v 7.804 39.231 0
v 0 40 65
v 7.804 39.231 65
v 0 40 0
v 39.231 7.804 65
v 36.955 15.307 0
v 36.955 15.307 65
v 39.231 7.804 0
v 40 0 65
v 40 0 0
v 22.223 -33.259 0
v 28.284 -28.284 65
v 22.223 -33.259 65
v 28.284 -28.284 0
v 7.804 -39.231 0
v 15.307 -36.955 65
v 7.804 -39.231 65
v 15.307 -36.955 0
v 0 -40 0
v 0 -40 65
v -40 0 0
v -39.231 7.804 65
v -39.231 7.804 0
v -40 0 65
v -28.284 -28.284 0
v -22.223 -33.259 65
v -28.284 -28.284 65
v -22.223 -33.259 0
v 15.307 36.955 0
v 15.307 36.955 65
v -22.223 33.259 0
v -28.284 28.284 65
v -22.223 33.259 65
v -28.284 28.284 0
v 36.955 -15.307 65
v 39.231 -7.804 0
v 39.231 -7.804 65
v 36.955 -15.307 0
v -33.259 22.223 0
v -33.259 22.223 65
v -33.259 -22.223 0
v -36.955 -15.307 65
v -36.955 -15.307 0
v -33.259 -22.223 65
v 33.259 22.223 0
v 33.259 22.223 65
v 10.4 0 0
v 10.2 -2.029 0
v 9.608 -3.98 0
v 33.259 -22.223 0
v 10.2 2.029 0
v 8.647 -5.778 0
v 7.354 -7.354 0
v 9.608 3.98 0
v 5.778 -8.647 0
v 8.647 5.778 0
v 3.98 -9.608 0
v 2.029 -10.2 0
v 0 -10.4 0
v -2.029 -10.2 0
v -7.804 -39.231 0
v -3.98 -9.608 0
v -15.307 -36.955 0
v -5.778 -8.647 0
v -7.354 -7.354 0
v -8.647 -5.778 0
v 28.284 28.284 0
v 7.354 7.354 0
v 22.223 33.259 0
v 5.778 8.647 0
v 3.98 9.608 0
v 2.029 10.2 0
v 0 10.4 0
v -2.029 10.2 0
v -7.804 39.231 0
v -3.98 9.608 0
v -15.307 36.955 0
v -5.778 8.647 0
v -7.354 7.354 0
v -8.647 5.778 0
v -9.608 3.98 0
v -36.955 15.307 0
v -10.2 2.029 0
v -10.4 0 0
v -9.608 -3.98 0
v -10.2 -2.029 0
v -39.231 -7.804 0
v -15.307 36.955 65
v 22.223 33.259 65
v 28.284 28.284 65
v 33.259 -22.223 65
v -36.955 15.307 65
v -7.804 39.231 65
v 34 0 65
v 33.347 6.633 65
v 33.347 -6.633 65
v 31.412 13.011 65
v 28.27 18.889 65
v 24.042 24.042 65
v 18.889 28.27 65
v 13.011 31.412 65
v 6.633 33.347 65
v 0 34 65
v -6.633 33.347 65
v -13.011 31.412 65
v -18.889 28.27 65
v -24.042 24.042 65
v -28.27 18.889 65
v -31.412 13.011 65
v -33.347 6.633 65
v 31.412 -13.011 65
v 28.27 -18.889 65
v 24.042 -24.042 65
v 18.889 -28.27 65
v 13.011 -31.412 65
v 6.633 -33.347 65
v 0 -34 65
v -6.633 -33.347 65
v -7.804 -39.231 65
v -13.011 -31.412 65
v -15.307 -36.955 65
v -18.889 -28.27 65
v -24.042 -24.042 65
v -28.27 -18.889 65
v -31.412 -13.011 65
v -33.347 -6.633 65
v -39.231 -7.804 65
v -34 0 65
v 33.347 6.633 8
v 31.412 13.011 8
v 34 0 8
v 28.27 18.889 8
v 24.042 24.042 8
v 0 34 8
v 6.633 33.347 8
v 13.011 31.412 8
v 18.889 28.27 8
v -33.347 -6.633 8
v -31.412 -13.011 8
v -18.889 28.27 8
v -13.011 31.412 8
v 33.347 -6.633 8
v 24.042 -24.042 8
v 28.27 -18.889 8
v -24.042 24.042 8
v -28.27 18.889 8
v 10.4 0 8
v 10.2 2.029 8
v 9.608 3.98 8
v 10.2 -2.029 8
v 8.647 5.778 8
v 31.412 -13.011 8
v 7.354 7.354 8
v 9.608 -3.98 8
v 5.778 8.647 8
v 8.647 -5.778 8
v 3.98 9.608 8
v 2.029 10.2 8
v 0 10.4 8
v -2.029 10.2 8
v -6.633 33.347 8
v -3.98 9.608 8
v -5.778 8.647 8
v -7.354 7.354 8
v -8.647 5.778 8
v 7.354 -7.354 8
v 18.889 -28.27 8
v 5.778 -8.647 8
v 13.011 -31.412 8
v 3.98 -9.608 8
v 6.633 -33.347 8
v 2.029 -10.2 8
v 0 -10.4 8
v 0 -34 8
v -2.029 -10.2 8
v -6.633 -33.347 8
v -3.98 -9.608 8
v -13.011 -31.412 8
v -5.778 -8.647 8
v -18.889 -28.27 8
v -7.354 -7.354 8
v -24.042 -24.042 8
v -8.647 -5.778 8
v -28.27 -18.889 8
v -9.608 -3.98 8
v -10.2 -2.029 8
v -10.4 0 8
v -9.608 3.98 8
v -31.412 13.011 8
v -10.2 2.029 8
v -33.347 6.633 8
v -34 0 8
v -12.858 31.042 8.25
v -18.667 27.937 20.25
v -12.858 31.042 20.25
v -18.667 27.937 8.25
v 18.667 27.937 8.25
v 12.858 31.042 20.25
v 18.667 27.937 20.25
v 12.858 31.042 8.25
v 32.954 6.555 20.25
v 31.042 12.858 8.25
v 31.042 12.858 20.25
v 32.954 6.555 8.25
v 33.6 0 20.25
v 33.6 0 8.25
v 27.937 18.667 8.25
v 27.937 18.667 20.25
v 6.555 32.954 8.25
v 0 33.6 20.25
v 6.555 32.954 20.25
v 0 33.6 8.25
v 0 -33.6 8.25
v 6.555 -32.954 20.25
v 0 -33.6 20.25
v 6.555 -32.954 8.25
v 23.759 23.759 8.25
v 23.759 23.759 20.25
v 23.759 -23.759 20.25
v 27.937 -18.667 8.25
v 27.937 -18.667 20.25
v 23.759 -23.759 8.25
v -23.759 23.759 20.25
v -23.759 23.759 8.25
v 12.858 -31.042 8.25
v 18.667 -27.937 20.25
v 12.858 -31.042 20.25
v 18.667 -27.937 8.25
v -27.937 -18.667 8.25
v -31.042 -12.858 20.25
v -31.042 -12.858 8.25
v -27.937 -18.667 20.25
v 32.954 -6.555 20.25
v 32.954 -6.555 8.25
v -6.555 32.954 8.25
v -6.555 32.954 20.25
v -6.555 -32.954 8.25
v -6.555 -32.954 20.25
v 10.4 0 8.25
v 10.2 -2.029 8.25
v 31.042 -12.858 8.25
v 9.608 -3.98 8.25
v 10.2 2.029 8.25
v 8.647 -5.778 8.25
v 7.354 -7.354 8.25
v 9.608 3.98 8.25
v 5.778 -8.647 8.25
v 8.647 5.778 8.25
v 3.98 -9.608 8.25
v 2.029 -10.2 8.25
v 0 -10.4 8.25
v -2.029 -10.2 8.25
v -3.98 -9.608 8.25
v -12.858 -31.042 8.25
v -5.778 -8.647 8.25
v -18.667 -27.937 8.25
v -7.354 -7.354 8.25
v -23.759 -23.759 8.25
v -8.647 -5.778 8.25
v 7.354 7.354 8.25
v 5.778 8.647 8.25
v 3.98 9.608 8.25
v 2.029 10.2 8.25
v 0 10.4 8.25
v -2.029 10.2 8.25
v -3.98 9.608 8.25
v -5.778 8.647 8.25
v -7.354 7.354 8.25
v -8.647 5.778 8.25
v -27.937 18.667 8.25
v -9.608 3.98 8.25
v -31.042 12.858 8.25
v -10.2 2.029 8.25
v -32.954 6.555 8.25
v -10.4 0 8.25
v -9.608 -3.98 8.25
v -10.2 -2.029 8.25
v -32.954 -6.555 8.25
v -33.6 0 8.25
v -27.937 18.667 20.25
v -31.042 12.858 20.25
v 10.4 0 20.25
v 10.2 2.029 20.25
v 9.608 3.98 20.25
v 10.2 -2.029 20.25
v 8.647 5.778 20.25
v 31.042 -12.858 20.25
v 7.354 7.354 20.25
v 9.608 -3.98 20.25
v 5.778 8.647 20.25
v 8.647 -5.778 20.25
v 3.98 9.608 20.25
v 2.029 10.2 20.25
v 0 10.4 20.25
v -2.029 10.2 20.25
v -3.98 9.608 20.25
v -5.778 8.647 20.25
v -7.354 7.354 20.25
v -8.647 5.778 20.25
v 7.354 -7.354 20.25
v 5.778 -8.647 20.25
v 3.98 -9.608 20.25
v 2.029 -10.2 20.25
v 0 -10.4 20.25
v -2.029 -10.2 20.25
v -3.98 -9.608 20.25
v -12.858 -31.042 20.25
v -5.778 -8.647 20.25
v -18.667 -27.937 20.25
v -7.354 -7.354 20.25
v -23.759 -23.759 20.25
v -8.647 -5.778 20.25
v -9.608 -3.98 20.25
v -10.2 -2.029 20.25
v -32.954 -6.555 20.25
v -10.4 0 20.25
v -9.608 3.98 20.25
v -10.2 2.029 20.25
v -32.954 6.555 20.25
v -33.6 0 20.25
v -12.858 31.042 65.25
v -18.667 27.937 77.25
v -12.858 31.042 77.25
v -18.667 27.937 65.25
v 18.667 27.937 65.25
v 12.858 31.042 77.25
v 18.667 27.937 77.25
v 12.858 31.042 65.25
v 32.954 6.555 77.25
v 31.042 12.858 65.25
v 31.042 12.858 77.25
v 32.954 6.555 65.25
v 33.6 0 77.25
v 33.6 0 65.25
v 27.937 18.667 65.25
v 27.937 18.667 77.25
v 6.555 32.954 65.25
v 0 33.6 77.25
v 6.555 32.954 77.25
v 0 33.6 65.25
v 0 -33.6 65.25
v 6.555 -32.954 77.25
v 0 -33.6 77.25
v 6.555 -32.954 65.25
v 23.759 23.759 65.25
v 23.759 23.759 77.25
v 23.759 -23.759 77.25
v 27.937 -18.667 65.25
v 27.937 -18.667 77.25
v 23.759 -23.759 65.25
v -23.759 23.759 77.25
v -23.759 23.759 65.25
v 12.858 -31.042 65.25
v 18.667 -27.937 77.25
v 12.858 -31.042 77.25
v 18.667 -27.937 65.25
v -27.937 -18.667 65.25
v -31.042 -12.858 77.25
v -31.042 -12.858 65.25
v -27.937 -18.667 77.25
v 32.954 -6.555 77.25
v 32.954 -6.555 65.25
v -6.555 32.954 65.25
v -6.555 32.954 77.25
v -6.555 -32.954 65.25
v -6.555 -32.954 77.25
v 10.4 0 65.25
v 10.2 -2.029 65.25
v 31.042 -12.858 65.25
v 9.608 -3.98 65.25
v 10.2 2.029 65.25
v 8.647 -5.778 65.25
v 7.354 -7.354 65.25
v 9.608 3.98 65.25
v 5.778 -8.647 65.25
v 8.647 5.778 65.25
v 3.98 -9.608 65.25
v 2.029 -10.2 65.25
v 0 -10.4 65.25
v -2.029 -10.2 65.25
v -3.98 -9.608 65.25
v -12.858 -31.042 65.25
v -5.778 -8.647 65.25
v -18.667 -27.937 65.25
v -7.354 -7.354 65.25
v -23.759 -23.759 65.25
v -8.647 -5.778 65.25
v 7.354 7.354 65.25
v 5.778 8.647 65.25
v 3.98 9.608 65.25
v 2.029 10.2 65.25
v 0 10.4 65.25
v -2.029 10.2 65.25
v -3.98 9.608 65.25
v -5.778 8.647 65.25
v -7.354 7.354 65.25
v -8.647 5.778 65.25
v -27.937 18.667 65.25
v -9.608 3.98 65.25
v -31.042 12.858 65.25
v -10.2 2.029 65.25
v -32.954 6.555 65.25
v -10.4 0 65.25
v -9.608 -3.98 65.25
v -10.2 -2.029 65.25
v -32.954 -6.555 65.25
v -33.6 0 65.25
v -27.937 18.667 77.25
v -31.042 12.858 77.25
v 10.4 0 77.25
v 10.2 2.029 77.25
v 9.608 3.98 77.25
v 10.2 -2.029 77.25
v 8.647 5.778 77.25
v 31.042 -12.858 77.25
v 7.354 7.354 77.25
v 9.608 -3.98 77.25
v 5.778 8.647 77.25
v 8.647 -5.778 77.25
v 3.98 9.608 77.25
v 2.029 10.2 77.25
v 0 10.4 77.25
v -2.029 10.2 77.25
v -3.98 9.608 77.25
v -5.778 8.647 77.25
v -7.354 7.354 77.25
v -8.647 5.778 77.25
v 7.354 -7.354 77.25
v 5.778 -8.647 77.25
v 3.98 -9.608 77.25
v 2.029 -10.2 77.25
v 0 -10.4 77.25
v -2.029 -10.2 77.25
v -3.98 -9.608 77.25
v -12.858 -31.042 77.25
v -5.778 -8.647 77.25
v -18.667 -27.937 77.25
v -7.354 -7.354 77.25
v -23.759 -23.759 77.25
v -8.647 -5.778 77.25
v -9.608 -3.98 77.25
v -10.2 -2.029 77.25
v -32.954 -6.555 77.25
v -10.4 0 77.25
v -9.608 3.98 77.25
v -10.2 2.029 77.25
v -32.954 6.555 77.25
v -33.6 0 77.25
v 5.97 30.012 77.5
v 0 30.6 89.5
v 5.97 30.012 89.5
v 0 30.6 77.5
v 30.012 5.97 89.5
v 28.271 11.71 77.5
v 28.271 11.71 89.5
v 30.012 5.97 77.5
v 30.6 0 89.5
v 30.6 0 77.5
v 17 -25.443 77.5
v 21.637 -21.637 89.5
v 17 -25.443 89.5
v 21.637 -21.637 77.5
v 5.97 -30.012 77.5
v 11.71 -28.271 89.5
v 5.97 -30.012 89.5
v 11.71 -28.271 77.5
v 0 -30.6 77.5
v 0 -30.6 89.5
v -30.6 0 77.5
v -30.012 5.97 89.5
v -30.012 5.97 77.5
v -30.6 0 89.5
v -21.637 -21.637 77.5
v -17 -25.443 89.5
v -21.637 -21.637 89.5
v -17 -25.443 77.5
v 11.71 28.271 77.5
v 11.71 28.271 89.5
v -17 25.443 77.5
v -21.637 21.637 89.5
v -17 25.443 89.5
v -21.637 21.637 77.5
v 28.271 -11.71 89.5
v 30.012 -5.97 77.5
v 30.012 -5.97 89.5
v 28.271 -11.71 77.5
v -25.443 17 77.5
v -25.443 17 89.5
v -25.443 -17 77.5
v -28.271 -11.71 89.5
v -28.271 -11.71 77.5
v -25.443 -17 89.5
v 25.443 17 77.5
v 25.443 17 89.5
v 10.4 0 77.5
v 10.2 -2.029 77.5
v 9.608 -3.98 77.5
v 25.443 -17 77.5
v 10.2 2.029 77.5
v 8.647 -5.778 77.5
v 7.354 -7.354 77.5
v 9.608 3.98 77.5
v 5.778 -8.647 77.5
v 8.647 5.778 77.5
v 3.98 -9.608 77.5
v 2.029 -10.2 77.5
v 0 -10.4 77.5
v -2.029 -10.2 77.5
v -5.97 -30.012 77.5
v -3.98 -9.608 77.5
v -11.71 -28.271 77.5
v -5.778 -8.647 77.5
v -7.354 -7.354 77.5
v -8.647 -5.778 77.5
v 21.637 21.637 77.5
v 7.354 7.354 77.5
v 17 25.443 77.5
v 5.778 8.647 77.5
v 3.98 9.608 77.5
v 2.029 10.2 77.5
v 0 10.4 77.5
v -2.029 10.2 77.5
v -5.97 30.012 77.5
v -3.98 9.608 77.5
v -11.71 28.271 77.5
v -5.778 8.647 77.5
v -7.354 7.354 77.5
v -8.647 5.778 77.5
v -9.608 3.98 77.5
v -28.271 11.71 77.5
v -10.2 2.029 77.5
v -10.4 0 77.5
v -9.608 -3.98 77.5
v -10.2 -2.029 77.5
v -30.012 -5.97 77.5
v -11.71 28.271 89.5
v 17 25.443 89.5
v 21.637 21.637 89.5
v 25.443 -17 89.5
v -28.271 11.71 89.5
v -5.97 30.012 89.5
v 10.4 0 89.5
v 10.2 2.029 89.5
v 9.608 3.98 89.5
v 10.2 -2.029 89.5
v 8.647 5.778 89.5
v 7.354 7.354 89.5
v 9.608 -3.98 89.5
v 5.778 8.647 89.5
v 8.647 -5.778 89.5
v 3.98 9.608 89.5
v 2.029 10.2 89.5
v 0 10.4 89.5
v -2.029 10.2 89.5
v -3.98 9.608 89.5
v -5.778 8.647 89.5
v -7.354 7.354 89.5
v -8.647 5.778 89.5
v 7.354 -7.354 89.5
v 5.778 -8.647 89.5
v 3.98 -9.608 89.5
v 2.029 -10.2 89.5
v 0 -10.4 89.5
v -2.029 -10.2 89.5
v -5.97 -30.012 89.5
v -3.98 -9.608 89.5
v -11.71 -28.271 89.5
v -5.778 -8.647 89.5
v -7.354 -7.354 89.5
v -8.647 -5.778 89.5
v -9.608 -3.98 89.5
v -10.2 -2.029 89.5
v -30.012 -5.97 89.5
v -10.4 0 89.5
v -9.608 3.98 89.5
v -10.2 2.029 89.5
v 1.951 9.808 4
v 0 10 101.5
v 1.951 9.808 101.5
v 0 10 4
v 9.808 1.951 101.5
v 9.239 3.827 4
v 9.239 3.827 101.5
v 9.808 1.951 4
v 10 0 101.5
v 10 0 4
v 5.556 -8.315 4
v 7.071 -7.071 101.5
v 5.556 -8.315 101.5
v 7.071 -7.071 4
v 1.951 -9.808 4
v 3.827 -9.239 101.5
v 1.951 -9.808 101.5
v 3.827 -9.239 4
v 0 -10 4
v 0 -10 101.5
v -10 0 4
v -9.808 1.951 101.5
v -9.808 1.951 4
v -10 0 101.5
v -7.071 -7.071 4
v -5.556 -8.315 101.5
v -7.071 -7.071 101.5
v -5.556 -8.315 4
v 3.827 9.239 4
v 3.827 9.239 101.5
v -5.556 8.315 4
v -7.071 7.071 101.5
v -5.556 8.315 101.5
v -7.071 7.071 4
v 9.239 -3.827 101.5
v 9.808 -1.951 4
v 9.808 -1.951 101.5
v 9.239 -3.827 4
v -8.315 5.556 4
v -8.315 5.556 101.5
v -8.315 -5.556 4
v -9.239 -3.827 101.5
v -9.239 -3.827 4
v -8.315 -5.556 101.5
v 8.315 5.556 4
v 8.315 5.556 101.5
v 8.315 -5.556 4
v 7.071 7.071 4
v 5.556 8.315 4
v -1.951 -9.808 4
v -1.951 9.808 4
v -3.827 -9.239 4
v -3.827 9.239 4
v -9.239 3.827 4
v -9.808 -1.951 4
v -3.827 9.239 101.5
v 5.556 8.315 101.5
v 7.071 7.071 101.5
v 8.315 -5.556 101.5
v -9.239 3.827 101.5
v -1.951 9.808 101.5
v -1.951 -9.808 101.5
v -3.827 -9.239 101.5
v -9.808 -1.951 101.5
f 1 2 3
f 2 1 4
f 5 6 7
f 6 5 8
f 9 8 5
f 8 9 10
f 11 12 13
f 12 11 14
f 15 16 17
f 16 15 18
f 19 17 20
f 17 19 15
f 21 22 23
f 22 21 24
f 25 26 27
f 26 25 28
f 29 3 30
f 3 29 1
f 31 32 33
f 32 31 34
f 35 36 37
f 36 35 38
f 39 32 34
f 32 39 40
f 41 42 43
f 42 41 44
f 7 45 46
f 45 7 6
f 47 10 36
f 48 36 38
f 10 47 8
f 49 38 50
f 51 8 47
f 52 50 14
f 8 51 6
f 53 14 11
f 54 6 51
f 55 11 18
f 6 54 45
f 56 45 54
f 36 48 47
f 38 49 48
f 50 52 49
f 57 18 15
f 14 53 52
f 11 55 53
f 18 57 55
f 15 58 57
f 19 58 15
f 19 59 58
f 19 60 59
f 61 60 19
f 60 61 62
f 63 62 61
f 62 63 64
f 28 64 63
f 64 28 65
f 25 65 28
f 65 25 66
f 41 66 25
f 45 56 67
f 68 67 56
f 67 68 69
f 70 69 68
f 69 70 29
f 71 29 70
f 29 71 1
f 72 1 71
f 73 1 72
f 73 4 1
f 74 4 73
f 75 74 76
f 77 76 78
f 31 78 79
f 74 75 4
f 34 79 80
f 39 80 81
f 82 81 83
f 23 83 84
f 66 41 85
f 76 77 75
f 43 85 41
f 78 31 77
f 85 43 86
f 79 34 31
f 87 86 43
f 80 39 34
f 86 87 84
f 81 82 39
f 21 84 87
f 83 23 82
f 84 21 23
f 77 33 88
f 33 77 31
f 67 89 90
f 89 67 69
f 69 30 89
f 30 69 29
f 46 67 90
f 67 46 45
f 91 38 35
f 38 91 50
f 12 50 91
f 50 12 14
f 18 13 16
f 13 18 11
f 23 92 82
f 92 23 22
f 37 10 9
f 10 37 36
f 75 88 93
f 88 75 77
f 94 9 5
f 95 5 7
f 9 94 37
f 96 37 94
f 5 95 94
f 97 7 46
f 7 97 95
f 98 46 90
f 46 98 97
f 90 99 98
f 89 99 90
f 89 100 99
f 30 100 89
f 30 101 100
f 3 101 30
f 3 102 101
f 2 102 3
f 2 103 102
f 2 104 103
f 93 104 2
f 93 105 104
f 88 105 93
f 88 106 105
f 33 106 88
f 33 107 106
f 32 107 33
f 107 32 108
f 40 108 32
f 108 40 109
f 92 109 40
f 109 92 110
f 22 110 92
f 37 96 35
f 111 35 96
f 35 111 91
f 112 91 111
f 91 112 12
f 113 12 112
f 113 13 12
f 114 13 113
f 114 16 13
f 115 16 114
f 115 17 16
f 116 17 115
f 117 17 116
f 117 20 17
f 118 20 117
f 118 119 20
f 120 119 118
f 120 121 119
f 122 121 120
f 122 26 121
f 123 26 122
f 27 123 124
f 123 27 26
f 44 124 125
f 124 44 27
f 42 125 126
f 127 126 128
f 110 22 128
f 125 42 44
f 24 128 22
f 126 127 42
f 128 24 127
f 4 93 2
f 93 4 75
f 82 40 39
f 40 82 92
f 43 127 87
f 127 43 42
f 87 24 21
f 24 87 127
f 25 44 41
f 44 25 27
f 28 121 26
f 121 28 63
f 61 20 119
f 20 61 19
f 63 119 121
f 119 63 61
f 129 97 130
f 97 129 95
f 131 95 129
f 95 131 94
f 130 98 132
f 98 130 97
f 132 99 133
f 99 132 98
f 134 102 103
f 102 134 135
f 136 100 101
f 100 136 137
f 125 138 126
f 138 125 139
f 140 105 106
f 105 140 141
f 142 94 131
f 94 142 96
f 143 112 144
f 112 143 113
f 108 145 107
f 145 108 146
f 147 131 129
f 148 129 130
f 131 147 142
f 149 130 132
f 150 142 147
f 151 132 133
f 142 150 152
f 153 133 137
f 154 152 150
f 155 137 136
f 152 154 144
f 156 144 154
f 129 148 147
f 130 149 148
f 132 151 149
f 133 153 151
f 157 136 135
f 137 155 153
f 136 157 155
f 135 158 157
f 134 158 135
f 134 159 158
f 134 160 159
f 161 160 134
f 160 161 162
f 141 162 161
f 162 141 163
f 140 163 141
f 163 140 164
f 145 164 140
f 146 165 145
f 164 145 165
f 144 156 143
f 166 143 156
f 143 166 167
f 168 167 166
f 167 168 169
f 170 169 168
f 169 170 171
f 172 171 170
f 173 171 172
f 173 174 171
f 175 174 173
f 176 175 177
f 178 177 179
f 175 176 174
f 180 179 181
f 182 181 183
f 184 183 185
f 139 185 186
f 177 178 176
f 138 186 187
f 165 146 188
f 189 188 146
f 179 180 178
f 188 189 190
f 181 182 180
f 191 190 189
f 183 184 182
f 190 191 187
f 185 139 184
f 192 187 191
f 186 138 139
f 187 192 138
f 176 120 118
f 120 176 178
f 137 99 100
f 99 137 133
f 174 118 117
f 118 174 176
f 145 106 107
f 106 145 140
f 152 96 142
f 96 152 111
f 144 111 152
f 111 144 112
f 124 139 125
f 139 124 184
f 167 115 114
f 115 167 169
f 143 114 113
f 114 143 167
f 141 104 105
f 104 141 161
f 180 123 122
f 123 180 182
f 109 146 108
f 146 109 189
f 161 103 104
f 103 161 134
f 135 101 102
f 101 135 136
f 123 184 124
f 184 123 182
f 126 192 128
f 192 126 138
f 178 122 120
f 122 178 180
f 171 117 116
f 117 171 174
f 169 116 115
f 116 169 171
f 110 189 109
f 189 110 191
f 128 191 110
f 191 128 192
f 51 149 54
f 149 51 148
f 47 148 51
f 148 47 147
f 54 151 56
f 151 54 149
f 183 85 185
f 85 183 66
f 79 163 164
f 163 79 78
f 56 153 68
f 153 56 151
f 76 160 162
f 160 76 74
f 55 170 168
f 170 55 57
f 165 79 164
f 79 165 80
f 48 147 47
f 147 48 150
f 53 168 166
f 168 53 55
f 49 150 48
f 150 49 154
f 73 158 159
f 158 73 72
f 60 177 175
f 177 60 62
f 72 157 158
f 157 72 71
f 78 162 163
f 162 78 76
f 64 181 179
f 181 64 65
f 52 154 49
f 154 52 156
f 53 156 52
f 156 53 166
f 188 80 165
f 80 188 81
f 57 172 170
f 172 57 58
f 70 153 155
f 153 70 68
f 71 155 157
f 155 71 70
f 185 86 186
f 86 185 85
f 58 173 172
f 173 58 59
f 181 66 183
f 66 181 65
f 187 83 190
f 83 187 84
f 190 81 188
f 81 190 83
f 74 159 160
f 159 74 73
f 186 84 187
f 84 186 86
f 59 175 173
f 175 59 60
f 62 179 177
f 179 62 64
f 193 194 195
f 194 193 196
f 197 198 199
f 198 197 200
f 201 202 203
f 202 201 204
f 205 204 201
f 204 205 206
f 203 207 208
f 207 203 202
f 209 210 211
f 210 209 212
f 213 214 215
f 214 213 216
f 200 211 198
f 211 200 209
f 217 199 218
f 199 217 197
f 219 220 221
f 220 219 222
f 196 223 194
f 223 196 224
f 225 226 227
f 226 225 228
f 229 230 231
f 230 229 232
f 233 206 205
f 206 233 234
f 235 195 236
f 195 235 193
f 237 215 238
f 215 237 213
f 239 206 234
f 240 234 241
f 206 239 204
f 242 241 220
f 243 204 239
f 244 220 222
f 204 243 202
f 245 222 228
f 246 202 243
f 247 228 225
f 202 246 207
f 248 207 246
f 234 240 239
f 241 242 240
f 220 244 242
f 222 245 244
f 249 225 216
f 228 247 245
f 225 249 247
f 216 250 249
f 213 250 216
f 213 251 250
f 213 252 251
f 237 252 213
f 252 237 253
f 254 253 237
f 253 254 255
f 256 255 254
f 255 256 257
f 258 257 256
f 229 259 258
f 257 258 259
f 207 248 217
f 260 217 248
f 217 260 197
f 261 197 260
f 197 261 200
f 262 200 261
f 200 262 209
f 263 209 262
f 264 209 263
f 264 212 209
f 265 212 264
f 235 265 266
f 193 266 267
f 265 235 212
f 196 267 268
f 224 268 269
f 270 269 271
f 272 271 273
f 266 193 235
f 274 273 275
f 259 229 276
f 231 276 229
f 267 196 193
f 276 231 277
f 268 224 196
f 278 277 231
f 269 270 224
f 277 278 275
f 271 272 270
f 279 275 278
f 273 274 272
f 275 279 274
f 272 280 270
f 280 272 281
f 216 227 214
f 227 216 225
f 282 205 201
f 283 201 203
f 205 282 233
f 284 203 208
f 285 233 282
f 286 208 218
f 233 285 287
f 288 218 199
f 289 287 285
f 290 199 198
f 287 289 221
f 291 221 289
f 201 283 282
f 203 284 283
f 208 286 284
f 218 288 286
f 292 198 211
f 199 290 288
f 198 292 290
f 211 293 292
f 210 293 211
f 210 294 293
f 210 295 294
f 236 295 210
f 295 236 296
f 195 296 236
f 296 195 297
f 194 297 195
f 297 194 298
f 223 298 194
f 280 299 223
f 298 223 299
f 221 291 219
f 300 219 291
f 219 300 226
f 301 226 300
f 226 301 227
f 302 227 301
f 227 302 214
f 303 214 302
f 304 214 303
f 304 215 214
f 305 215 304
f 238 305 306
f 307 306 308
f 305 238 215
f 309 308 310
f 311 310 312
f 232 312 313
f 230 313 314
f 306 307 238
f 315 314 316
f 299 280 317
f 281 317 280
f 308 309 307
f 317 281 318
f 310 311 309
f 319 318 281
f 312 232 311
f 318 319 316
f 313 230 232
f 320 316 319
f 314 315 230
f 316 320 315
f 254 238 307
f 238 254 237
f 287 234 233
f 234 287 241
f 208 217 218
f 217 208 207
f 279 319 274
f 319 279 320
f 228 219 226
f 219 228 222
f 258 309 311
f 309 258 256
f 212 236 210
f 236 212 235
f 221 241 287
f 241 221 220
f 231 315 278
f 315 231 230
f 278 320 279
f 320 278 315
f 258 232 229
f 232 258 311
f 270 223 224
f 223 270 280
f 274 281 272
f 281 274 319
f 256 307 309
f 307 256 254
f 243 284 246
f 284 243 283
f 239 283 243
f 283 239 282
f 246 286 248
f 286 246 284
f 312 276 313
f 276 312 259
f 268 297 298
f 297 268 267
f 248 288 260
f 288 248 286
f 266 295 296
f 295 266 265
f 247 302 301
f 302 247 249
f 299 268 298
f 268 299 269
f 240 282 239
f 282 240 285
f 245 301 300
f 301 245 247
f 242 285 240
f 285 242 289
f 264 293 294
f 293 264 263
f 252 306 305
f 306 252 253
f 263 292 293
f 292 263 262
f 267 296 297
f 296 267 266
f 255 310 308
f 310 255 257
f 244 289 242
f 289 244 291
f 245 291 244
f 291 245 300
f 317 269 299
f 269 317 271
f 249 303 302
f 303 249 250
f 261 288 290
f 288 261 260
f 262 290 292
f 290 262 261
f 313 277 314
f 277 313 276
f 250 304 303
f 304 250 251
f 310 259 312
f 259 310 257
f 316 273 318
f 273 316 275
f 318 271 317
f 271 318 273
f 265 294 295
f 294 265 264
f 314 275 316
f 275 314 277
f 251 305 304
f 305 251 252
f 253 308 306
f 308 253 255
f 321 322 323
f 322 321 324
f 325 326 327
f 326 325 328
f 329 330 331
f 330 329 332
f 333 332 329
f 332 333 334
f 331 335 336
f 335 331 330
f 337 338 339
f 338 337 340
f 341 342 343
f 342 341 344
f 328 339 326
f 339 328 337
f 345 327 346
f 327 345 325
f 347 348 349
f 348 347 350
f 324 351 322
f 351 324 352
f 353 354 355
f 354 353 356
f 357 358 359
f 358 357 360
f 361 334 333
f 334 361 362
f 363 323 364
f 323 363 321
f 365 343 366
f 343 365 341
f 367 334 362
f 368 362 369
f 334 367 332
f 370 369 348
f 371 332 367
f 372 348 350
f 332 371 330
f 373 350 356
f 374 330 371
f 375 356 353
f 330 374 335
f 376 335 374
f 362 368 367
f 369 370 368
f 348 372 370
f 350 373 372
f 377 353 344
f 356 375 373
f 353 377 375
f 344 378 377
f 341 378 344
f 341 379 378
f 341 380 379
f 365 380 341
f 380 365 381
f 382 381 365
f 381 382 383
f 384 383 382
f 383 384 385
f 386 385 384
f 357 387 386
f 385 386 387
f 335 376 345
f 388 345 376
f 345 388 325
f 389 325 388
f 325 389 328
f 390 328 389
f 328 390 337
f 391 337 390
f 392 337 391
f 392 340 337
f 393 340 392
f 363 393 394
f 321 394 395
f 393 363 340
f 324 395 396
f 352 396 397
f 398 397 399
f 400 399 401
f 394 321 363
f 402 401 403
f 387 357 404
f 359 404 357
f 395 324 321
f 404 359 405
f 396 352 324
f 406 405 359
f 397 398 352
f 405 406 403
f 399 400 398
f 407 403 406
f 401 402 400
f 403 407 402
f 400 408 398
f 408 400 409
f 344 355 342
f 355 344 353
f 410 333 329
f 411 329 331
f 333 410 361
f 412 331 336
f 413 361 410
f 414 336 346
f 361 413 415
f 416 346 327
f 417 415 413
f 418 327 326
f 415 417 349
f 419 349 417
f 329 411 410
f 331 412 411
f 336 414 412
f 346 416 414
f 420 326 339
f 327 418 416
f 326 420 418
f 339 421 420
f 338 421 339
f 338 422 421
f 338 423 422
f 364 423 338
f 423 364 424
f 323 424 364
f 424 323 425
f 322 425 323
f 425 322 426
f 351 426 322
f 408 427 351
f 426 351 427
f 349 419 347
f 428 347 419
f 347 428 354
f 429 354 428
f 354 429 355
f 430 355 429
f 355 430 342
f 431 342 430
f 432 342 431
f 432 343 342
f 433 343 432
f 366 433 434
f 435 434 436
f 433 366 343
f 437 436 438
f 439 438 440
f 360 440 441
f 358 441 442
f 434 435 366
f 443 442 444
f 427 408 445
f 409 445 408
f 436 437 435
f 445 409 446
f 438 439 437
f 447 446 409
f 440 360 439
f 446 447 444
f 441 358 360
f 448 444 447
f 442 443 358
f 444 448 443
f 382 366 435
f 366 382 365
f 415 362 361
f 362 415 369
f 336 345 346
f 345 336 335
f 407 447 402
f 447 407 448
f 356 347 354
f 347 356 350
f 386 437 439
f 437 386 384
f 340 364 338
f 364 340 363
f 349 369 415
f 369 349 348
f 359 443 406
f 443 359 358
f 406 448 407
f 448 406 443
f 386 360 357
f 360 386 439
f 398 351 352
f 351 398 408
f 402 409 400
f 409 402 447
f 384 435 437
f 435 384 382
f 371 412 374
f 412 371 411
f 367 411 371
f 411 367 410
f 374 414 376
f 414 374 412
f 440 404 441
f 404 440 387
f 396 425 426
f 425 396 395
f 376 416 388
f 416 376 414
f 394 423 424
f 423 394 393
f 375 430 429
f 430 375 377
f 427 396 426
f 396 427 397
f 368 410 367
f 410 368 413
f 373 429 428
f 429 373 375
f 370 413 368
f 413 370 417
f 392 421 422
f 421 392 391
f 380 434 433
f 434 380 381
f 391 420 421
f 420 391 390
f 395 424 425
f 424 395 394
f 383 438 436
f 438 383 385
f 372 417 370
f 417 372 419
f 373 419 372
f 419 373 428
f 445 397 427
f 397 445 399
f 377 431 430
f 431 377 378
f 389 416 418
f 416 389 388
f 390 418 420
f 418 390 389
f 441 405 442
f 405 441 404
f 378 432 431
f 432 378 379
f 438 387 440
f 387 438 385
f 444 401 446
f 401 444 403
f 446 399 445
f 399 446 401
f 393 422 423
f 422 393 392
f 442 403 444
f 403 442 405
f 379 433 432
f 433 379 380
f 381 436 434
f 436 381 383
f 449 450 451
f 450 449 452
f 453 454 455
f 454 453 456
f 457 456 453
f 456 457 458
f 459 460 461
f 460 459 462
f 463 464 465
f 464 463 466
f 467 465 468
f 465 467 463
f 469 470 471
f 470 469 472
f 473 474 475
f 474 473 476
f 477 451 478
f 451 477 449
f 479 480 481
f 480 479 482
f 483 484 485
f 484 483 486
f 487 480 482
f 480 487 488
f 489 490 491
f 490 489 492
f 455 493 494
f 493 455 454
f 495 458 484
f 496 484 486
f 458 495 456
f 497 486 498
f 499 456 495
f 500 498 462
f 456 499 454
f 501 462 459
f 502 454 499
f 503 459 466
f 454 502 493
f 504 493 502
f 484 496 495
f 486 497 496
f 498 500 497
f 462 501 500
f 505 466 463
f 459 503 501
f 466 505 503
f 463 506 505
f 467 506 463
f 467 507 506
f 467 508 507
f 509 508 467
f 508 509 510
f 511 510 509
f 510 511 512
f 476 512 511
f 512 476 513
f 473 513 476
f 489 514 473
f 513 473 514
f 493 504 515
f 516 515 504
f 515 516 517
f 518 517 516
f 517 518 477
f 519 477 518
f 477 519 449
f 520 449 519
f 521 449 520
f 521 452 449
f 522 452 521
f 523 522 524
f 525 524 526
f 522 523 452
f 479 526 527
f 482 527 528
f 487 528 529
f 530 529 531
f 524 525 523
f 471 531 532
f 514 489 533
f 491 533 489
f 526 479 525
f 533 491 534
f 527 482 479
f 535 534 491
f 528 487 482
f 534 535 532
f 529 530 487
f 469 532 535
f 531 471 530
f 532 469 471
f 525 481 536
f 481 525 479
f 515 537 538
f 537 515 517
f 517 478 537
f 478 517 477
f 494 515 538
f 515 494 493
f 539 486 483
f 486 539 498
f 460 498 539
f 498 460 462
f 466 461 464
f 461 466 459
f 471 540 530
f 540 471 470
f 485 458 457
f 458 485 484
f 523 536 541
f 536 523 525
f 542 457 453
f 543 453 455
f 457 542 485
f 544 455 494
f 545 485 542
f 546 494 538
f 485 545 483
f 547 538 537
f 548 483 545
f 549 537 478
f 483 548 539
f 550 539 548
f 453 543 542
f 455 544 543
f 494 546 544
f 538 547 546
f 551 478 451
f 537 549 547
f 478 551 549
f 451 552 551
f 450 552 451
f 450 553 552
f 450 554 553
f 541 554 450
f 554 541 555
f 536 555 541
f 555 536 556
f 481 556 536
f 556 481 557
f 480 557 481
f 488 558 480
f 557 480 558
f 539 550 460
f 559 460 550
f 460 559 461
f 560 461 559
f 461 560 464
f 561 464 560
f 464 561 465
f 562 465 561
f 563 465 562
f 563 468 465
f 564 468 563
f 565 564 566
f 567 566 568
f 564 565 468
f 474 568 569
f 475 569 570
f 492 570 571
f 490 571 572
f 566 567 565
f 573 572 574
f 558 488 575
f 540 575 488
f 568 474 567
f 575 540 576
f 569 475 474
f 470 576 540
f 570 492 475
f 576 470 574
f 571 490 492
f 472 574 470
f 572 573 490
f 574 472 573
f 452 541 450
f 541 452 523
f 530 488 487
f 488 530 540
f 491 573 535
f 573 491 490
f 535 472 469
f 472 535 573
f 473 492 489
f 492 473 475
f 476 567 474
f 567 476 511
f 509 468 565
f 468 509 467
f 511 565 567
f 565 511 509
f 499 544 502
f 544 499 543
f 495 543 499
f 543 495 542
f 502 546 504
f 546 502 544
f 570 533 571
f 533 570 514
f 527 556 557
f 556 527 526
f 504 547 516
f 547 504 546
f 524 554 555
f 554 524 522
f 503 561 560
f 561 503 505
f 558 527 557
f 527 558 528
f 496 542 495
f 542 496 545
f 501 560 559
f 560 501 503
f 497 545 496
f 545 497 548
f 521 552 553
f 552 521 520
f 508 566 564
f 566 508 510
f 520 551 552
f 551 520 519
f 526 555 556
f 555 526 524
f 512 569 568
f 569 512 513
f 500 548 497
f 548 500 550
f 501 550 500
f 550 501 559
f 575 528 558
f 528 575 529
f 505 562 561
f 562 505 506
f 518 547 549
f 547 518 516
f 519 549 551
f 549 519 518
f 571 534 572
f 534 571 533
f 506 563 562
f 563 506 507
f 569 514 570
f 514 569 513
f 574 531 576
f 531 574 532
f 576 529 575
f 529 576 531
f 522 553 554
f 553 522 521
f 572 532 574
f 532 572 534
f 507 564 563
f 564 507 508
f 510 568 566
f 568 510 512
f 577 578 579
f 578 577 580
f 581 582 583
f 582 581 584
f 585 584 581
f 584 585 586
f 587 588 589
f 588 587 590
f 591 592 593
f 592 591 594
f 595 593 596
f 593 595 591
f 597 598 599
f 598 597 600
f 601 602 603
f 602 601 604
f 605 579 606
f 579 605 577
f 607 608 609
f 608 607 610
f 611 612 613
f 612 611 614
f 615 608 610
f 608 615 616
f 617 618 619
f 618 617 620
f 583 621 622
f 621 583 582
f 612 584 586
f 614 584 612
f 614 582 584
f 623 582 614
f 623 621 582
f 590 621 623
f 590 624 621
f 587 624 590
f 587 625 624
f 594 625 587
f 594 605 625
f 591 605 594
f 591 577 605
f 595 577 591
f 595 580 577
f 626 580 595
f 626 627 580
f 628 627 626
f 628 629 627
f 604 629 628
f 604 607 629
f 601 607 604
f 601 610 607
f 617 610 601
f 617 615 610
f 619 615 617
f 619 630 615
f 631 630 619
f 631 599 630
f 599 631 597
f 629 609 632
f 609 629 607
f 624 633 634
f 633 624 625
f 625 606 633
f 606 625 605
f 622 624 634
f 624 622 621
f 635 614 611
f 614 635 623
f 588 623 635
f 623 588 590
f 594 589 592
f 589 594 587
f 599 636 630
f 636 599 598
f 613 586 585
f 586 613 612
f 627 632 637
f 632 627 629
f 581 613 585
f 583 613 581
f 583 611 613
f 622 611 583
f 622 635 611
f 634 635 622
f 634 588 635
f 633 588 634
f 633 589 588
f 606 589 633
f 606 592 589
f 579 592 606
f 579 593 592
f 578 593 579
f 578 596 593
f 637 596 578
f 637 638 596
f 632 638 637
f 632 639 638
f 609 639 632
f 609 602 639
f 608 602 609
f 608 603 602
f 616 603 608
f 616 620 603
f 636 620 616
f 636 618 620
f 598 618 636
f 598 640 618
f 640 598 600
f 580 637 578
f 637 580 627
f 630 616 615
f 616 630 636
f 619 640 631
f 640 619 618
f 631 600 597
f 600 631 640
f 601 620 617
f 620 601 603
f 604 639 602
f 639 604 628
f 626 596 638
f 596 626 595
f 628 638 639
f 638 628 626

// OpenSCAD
$fn = 32;

// ------------------------------------------------------------------------
// Bearing housing: housing d80, two bearings and a shaft
// Every part is its own module, assembly() places them once.
// ------------------------------------------------------------------------

// --- part 1 ---
module housing() {
  difference() {
    cylinder(h = 65, d = 80);
    translate([0, 0, 8]) cylinder(h = 58, d = 68);
    translate([0, 0, -1]) cylinder(h = 10, d = 20.8);
  }
}

// --- part 2 ---
module bearing_lower() {
  difference() {
      translate([0, 0, 0]) cylinder(h = 12, d = 67.2);
      translate([0, 0, -1]) cylinder(h = 14, d = 20.8);
    }
}

// --- part 3 ---
module bearing_upper() {
  difference() {
      translate([0, 0, 0]) cylinder(h = 12, d = 67.2);
      translate([0, 0, -1]) cylinder(h = 14, d = 20.8);
    }
}

// --- part 4 ---
module spacer() {
  difference() {
      translate([0, 0, 0]) cylinder(h = 12, d = 61.2);
      translate([0, 0, -1]) cylinder(h = 14, d = 20.8);
    }
}

// --- part 5 ---
module shaft() {
  translate([0, 0, -48.75]) cylinder(h = 97.5, d = 20);
}

// --- assembly ---
module assembly() {
  translate([0, 0, 0]) rotate([0, 0, 0]) housing();
  translate([0, 0, 8.25]) rotate([0, 0, 0]) bearing_lower();
  translate([0, 0, 65.25]) rotate([0, 0, 0]) bearing_upper();
  translate([0, 0, 77.5]) rotate([0, 0, 0]) spacer();
  translate([0, 0, 52.75]) rotate([0, 0, 0]) shaft();
}

assembly();
